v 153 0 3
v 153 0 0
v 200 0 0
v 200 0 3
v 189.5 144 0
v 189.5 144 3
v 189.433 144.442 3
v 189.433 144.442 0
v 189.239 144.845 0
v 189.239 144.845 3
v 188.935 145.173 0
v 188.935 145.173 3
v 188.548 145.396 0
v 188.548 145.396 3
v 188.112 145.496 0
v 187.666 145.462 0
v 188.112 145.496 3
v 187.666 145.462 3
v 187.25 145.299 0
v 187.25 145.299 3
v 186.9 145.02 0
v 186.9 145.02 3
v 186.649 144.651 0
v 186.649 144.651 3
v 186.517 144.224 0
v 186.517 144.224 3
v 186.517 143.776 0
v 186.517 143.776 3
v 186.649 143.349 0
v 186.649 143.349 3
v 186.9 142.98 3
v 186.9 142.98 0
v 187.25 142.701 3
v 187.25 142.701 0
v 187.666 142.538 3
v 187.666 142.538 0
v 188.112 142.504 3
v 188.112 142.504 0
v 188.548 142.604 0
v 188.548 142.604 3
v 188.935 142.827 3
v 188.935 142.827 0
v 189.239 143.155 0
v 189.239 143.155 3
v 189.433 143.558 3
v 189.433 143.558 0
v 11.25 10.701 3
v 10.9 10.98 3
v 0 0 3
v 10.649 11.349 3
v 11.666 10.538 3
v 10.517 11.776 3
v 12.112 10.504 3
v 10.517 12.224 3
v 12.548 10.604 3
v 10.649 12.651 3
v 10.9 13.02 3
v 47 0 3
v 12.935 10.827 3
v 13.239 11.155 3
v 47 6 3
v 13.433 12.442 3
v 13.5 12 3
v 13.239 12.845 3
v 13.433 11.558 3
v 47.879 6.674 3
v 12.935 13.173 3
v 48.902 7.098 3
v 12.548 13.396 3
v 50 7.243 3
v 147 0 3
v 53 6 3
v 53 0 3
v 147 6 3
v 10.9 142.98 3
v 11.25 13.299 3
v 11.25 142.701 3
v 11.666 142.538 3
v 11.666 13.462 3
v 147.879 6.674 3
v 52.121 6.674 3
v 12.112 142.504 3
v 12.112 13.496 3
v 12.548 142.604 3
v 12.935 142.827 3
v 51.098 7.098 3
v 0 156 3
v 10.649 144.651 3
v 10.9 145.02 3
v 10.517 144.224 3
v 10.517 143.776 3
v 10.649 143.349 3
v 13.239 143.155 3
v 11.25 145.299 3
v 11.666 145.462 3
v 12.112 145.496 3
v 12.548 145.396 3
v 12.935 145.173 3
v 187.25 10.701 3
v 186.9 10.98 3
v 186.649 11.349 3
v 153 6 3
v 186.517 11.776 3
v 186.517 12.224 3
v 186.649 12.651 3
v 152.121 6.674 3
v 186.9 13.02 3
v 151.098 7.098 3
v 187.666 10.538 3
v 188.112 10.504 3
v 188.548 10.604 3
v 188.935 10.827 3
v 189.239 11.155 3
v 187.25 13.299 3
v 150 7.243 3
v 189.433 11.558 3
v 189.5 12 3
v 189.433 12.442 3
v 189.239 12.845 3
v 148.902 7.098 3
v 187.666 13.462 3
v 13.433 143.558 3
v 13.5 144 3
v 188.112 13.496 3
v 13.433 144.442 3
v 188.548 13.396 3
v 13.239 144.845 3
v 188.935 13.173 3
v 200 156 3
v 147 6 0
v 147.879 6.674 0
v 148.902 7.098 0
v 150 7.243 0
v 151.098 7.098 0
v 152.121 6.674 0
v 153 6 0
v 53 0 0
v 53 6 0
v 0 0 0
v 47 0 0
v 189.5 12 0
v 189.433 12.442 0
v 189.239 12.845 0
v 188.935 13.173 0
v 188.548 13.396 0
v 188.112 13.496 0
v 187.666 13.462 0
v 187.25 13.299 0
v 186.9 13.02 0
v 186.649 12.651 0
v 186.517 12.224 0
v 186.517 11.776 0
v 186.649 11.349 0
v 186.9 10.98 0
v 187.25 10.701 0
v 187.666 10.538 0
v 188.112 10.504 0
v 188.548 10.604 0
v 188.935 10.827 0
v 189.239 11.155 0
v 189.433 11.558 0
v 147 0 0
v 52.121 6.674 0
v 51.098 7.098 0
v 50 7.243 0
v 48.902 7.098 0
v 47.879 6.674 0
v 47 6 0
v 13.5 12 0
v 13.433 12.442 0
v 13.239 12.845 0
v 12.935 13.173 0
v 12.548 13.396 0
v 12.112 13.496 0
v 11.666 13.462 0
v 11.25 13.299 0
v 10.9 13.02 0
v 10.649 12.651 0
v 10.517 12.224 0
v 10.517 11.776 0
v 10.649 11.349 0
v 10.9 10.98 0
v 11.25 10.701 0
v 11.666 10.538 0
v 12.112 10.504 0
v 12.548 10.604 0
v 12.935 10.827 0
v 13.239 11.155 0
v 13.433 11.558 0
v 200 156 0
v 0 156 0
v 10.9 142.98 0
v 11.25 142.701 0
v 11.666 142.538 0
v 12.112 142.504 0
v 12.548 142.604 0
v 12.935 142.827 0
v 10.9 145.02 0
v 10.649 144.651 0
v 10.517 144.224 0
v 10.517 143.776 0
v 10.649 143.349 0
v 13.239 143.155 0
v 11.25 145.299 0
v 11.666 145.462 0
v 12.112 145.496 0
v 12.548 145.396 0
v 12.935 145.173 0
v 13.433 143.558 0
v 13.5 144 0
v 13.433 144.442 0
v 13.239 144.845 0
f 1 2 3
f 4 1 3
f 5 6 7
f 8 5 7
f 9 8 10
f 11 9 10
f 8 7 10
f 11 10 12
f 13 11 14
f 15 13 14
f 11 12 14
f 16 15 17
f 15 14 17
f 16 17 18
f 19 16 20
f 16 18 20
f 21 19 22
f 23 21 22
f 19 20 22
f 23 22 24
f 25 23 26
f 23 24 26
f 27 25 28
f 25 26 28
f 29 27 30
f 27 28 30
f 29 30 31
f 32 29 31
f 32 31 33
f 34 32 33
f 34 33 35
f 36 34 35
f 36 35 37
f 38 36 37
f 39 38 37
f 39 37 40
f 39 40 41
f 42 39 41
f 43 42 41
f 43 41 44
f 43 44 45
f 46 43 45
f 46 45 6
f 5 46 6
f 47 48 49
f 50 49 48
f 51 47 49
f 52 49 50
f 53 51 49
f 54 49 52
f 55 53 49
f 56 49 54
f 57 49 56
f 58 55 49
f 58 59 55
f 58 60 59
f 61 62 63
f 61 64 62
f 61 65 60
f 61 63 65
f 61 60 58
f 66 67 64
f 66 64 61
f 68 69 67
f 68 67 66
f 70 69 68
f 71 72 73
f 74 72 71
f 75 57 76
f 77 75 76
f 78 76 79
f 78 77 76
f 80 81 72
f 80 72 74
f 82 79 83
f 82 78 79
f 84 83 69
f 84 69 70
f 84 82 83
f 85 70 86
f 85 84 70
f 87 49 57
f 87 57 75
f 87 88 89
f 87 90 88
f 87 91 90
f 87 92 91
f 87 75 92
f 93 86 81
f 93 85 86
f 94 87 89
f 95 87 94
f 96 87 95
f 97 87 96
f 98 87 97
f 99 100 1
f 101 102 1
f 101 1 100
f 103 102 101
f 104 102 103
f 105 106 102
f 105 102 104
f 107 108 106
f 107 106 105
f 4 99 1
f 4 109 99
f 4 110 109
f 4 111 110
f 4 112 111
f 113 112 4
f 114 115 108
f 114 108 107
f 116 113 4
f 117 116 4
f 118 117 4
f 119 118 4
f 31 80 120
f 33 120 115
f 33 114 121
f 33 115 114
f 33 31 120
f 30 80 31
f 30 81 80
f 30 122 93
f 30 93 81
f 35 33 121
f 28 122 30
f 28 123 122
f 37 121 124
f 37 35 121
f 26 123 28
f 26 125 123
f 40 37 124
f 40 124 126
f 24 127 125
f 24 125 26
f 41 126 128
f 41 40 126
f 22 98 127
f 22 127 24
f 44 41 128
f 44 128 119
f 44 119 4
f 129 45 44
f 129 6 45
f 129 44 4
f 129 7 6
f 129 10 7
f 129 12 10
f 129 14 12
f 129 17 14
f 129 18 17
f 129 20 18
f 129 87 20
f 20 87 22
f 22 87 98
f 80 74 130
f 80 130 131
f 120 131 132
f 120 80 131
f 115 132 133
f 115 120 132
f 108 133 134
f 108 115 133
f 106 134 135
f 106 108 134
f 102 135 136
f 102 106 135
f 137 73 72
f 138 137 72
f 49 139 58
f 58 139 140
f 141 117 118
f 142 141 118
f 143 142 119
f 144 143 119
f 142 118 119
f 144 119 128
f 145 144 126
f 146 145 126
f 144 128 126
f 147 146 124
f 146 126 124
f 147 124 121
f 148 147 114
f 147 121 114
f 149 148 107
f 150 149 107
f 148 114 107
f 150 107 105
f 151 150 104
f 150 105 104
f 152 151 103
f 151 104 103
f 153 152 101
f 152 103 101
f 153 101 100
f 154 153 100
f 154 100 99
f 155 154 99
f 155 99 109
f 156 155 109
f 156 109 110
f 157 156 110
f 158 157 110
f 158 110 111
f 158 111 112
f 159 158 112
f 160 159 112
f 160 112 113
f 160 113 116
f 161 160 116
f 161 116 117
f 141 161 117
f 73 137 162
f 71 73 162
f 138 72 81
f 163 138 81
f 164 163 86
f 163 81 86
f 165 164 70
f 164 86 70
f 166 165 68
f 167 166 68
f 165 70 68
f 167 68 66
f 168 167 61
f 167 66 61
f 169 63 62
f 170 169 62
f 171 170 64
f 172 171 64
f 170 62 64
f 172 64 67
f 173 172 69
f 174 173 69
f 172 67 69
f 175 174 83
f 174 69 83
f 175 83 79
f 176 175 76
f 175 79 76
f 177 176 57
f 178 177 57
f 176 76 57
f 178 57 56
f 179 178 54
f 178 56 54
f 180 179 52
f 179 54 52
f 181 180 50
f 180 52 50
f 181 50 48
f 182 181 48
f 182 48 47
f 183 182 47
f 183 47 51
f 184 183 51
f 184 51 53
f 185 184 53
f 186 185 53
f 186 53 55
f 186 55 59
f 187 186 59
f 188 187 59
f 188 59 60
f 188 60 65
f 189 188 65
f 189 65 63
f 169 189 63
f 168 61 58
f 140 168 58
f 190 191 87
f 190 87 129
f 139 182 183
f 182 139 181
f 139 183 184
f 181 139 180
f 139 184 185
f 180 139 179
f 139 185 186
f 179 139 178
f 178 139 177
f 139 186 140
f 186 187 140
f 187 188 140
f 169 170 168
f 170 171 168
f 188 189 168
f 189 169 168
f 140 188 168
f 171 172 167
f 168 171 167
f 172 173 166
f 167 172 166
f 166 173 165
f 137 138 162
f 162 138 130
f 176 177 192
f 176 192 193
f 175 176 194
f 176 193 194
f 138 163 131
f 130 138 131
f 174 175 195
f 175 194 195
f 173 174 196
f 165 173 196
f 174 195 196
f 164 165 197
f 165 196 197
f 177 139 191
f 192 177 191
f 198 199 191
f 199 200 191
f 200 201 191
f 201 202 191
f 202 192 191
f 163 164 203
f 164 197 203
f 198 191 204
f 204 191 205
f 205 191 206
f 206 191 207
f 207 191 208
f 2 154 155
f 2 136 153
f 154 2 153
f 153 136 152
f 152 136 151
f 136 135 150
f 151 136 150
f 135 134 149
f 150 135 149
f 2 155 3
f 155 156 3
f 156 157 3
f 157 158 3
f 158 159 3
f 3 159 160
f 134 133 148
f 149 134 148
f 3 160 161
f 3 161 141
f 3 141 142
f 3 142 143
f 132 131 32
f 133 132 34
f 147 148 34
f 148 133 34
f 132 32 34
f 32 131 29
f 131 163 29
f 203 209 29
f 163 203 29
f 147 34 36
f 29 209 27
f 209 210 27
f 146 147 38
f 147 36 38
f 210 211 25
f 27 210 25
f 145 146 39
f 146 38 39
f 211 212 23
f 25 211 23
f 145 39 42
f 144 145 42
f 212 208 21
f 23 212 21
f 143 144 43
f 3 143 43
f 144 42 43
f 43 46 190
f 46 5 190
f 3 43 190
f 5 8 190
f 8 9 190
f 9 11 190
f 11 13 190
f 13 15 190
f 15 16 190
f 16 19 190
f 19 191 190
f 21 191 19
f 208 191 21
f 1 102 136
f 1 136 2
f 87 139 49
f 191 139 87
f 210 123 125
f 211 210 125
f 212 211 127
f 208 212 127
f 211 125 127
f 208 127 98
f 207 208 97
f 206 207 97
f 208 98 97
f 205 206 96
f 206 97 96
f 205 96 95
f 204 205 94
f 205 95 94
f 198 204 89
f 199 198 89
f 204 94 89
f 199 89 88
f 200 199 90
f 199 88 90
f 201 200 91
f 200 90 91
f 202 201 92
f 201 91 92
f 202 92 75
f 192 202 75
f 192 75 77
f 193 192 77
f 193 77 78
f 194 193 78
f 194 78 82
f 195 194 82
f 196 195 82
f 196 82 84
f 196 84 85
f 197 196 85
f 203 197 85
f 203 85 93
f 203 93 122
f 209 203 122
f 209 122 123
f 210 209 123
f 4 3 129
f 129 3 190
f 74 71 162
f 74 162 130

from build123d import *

# Parameters (mm, degrees)
SKETCH1_W           = 200
SKETCH1_H           = 156
BOSS_EXTRUDE1_DEPTH = 3
SKETCH2_R           = 1.5
CUT_EXTRUDE1_DEPTH  = 17
CUT_EXTRUDE10_DEPTH = 10


with BuildPart() as part:
    # Sketch1 → Boss-Extrude1 (new body)
    with BuildSketch(Plane.XY):
        with Locations((100, 78)):
            Rectangle(SKETCH1_W, SKETCH1_H)
    extrude(amount=BOSS_EXTRUDE1_DEPTH)

    # Sketch2 → Cut-Extrude1 (cut)
    with BuildSketch(Plane.XY.offset(3)):
        with Locations((12, 12)):
            Circle(SKETCH2_R)
        with Locations((12, 144)):
            Circle(SKETCH2_R)
        with Locations((188, 144)):
            Circle(SKETCH2_R)
        with Locations((188, 12)):
            Circle(SKETCH2_R)
    extrude(amount=-CUT_EXTRUDE1_DEPTH, mode=Mode.SUBTRACT)

    # Sketch6 → Cut-Extrude10 (cut)
    with BuildSketch(Plane.XY.offset(3)):
        with BuildLine():
            Line((153, 0), (147, 0))
            Line((147, 0), (147, 6))
            ThreePointArc((147, 6), (150, 7.242640687), (153, 6))
            Line((153, 6), (153, 0))
        make_face()
        with BuildLine():
            Line((53, 0), (53, 6))
            ThreePointArc((53, 6), (50, 7.242640687), (47, 6))
            Line((47, 6), (47, 0))
            Line((47, 0), (53, 0))
        make_face()
    extrude(amount=-CUT_EXTRUDE10_DEPTH, mode=Mode.SUBTRACT)


solid = part.part
